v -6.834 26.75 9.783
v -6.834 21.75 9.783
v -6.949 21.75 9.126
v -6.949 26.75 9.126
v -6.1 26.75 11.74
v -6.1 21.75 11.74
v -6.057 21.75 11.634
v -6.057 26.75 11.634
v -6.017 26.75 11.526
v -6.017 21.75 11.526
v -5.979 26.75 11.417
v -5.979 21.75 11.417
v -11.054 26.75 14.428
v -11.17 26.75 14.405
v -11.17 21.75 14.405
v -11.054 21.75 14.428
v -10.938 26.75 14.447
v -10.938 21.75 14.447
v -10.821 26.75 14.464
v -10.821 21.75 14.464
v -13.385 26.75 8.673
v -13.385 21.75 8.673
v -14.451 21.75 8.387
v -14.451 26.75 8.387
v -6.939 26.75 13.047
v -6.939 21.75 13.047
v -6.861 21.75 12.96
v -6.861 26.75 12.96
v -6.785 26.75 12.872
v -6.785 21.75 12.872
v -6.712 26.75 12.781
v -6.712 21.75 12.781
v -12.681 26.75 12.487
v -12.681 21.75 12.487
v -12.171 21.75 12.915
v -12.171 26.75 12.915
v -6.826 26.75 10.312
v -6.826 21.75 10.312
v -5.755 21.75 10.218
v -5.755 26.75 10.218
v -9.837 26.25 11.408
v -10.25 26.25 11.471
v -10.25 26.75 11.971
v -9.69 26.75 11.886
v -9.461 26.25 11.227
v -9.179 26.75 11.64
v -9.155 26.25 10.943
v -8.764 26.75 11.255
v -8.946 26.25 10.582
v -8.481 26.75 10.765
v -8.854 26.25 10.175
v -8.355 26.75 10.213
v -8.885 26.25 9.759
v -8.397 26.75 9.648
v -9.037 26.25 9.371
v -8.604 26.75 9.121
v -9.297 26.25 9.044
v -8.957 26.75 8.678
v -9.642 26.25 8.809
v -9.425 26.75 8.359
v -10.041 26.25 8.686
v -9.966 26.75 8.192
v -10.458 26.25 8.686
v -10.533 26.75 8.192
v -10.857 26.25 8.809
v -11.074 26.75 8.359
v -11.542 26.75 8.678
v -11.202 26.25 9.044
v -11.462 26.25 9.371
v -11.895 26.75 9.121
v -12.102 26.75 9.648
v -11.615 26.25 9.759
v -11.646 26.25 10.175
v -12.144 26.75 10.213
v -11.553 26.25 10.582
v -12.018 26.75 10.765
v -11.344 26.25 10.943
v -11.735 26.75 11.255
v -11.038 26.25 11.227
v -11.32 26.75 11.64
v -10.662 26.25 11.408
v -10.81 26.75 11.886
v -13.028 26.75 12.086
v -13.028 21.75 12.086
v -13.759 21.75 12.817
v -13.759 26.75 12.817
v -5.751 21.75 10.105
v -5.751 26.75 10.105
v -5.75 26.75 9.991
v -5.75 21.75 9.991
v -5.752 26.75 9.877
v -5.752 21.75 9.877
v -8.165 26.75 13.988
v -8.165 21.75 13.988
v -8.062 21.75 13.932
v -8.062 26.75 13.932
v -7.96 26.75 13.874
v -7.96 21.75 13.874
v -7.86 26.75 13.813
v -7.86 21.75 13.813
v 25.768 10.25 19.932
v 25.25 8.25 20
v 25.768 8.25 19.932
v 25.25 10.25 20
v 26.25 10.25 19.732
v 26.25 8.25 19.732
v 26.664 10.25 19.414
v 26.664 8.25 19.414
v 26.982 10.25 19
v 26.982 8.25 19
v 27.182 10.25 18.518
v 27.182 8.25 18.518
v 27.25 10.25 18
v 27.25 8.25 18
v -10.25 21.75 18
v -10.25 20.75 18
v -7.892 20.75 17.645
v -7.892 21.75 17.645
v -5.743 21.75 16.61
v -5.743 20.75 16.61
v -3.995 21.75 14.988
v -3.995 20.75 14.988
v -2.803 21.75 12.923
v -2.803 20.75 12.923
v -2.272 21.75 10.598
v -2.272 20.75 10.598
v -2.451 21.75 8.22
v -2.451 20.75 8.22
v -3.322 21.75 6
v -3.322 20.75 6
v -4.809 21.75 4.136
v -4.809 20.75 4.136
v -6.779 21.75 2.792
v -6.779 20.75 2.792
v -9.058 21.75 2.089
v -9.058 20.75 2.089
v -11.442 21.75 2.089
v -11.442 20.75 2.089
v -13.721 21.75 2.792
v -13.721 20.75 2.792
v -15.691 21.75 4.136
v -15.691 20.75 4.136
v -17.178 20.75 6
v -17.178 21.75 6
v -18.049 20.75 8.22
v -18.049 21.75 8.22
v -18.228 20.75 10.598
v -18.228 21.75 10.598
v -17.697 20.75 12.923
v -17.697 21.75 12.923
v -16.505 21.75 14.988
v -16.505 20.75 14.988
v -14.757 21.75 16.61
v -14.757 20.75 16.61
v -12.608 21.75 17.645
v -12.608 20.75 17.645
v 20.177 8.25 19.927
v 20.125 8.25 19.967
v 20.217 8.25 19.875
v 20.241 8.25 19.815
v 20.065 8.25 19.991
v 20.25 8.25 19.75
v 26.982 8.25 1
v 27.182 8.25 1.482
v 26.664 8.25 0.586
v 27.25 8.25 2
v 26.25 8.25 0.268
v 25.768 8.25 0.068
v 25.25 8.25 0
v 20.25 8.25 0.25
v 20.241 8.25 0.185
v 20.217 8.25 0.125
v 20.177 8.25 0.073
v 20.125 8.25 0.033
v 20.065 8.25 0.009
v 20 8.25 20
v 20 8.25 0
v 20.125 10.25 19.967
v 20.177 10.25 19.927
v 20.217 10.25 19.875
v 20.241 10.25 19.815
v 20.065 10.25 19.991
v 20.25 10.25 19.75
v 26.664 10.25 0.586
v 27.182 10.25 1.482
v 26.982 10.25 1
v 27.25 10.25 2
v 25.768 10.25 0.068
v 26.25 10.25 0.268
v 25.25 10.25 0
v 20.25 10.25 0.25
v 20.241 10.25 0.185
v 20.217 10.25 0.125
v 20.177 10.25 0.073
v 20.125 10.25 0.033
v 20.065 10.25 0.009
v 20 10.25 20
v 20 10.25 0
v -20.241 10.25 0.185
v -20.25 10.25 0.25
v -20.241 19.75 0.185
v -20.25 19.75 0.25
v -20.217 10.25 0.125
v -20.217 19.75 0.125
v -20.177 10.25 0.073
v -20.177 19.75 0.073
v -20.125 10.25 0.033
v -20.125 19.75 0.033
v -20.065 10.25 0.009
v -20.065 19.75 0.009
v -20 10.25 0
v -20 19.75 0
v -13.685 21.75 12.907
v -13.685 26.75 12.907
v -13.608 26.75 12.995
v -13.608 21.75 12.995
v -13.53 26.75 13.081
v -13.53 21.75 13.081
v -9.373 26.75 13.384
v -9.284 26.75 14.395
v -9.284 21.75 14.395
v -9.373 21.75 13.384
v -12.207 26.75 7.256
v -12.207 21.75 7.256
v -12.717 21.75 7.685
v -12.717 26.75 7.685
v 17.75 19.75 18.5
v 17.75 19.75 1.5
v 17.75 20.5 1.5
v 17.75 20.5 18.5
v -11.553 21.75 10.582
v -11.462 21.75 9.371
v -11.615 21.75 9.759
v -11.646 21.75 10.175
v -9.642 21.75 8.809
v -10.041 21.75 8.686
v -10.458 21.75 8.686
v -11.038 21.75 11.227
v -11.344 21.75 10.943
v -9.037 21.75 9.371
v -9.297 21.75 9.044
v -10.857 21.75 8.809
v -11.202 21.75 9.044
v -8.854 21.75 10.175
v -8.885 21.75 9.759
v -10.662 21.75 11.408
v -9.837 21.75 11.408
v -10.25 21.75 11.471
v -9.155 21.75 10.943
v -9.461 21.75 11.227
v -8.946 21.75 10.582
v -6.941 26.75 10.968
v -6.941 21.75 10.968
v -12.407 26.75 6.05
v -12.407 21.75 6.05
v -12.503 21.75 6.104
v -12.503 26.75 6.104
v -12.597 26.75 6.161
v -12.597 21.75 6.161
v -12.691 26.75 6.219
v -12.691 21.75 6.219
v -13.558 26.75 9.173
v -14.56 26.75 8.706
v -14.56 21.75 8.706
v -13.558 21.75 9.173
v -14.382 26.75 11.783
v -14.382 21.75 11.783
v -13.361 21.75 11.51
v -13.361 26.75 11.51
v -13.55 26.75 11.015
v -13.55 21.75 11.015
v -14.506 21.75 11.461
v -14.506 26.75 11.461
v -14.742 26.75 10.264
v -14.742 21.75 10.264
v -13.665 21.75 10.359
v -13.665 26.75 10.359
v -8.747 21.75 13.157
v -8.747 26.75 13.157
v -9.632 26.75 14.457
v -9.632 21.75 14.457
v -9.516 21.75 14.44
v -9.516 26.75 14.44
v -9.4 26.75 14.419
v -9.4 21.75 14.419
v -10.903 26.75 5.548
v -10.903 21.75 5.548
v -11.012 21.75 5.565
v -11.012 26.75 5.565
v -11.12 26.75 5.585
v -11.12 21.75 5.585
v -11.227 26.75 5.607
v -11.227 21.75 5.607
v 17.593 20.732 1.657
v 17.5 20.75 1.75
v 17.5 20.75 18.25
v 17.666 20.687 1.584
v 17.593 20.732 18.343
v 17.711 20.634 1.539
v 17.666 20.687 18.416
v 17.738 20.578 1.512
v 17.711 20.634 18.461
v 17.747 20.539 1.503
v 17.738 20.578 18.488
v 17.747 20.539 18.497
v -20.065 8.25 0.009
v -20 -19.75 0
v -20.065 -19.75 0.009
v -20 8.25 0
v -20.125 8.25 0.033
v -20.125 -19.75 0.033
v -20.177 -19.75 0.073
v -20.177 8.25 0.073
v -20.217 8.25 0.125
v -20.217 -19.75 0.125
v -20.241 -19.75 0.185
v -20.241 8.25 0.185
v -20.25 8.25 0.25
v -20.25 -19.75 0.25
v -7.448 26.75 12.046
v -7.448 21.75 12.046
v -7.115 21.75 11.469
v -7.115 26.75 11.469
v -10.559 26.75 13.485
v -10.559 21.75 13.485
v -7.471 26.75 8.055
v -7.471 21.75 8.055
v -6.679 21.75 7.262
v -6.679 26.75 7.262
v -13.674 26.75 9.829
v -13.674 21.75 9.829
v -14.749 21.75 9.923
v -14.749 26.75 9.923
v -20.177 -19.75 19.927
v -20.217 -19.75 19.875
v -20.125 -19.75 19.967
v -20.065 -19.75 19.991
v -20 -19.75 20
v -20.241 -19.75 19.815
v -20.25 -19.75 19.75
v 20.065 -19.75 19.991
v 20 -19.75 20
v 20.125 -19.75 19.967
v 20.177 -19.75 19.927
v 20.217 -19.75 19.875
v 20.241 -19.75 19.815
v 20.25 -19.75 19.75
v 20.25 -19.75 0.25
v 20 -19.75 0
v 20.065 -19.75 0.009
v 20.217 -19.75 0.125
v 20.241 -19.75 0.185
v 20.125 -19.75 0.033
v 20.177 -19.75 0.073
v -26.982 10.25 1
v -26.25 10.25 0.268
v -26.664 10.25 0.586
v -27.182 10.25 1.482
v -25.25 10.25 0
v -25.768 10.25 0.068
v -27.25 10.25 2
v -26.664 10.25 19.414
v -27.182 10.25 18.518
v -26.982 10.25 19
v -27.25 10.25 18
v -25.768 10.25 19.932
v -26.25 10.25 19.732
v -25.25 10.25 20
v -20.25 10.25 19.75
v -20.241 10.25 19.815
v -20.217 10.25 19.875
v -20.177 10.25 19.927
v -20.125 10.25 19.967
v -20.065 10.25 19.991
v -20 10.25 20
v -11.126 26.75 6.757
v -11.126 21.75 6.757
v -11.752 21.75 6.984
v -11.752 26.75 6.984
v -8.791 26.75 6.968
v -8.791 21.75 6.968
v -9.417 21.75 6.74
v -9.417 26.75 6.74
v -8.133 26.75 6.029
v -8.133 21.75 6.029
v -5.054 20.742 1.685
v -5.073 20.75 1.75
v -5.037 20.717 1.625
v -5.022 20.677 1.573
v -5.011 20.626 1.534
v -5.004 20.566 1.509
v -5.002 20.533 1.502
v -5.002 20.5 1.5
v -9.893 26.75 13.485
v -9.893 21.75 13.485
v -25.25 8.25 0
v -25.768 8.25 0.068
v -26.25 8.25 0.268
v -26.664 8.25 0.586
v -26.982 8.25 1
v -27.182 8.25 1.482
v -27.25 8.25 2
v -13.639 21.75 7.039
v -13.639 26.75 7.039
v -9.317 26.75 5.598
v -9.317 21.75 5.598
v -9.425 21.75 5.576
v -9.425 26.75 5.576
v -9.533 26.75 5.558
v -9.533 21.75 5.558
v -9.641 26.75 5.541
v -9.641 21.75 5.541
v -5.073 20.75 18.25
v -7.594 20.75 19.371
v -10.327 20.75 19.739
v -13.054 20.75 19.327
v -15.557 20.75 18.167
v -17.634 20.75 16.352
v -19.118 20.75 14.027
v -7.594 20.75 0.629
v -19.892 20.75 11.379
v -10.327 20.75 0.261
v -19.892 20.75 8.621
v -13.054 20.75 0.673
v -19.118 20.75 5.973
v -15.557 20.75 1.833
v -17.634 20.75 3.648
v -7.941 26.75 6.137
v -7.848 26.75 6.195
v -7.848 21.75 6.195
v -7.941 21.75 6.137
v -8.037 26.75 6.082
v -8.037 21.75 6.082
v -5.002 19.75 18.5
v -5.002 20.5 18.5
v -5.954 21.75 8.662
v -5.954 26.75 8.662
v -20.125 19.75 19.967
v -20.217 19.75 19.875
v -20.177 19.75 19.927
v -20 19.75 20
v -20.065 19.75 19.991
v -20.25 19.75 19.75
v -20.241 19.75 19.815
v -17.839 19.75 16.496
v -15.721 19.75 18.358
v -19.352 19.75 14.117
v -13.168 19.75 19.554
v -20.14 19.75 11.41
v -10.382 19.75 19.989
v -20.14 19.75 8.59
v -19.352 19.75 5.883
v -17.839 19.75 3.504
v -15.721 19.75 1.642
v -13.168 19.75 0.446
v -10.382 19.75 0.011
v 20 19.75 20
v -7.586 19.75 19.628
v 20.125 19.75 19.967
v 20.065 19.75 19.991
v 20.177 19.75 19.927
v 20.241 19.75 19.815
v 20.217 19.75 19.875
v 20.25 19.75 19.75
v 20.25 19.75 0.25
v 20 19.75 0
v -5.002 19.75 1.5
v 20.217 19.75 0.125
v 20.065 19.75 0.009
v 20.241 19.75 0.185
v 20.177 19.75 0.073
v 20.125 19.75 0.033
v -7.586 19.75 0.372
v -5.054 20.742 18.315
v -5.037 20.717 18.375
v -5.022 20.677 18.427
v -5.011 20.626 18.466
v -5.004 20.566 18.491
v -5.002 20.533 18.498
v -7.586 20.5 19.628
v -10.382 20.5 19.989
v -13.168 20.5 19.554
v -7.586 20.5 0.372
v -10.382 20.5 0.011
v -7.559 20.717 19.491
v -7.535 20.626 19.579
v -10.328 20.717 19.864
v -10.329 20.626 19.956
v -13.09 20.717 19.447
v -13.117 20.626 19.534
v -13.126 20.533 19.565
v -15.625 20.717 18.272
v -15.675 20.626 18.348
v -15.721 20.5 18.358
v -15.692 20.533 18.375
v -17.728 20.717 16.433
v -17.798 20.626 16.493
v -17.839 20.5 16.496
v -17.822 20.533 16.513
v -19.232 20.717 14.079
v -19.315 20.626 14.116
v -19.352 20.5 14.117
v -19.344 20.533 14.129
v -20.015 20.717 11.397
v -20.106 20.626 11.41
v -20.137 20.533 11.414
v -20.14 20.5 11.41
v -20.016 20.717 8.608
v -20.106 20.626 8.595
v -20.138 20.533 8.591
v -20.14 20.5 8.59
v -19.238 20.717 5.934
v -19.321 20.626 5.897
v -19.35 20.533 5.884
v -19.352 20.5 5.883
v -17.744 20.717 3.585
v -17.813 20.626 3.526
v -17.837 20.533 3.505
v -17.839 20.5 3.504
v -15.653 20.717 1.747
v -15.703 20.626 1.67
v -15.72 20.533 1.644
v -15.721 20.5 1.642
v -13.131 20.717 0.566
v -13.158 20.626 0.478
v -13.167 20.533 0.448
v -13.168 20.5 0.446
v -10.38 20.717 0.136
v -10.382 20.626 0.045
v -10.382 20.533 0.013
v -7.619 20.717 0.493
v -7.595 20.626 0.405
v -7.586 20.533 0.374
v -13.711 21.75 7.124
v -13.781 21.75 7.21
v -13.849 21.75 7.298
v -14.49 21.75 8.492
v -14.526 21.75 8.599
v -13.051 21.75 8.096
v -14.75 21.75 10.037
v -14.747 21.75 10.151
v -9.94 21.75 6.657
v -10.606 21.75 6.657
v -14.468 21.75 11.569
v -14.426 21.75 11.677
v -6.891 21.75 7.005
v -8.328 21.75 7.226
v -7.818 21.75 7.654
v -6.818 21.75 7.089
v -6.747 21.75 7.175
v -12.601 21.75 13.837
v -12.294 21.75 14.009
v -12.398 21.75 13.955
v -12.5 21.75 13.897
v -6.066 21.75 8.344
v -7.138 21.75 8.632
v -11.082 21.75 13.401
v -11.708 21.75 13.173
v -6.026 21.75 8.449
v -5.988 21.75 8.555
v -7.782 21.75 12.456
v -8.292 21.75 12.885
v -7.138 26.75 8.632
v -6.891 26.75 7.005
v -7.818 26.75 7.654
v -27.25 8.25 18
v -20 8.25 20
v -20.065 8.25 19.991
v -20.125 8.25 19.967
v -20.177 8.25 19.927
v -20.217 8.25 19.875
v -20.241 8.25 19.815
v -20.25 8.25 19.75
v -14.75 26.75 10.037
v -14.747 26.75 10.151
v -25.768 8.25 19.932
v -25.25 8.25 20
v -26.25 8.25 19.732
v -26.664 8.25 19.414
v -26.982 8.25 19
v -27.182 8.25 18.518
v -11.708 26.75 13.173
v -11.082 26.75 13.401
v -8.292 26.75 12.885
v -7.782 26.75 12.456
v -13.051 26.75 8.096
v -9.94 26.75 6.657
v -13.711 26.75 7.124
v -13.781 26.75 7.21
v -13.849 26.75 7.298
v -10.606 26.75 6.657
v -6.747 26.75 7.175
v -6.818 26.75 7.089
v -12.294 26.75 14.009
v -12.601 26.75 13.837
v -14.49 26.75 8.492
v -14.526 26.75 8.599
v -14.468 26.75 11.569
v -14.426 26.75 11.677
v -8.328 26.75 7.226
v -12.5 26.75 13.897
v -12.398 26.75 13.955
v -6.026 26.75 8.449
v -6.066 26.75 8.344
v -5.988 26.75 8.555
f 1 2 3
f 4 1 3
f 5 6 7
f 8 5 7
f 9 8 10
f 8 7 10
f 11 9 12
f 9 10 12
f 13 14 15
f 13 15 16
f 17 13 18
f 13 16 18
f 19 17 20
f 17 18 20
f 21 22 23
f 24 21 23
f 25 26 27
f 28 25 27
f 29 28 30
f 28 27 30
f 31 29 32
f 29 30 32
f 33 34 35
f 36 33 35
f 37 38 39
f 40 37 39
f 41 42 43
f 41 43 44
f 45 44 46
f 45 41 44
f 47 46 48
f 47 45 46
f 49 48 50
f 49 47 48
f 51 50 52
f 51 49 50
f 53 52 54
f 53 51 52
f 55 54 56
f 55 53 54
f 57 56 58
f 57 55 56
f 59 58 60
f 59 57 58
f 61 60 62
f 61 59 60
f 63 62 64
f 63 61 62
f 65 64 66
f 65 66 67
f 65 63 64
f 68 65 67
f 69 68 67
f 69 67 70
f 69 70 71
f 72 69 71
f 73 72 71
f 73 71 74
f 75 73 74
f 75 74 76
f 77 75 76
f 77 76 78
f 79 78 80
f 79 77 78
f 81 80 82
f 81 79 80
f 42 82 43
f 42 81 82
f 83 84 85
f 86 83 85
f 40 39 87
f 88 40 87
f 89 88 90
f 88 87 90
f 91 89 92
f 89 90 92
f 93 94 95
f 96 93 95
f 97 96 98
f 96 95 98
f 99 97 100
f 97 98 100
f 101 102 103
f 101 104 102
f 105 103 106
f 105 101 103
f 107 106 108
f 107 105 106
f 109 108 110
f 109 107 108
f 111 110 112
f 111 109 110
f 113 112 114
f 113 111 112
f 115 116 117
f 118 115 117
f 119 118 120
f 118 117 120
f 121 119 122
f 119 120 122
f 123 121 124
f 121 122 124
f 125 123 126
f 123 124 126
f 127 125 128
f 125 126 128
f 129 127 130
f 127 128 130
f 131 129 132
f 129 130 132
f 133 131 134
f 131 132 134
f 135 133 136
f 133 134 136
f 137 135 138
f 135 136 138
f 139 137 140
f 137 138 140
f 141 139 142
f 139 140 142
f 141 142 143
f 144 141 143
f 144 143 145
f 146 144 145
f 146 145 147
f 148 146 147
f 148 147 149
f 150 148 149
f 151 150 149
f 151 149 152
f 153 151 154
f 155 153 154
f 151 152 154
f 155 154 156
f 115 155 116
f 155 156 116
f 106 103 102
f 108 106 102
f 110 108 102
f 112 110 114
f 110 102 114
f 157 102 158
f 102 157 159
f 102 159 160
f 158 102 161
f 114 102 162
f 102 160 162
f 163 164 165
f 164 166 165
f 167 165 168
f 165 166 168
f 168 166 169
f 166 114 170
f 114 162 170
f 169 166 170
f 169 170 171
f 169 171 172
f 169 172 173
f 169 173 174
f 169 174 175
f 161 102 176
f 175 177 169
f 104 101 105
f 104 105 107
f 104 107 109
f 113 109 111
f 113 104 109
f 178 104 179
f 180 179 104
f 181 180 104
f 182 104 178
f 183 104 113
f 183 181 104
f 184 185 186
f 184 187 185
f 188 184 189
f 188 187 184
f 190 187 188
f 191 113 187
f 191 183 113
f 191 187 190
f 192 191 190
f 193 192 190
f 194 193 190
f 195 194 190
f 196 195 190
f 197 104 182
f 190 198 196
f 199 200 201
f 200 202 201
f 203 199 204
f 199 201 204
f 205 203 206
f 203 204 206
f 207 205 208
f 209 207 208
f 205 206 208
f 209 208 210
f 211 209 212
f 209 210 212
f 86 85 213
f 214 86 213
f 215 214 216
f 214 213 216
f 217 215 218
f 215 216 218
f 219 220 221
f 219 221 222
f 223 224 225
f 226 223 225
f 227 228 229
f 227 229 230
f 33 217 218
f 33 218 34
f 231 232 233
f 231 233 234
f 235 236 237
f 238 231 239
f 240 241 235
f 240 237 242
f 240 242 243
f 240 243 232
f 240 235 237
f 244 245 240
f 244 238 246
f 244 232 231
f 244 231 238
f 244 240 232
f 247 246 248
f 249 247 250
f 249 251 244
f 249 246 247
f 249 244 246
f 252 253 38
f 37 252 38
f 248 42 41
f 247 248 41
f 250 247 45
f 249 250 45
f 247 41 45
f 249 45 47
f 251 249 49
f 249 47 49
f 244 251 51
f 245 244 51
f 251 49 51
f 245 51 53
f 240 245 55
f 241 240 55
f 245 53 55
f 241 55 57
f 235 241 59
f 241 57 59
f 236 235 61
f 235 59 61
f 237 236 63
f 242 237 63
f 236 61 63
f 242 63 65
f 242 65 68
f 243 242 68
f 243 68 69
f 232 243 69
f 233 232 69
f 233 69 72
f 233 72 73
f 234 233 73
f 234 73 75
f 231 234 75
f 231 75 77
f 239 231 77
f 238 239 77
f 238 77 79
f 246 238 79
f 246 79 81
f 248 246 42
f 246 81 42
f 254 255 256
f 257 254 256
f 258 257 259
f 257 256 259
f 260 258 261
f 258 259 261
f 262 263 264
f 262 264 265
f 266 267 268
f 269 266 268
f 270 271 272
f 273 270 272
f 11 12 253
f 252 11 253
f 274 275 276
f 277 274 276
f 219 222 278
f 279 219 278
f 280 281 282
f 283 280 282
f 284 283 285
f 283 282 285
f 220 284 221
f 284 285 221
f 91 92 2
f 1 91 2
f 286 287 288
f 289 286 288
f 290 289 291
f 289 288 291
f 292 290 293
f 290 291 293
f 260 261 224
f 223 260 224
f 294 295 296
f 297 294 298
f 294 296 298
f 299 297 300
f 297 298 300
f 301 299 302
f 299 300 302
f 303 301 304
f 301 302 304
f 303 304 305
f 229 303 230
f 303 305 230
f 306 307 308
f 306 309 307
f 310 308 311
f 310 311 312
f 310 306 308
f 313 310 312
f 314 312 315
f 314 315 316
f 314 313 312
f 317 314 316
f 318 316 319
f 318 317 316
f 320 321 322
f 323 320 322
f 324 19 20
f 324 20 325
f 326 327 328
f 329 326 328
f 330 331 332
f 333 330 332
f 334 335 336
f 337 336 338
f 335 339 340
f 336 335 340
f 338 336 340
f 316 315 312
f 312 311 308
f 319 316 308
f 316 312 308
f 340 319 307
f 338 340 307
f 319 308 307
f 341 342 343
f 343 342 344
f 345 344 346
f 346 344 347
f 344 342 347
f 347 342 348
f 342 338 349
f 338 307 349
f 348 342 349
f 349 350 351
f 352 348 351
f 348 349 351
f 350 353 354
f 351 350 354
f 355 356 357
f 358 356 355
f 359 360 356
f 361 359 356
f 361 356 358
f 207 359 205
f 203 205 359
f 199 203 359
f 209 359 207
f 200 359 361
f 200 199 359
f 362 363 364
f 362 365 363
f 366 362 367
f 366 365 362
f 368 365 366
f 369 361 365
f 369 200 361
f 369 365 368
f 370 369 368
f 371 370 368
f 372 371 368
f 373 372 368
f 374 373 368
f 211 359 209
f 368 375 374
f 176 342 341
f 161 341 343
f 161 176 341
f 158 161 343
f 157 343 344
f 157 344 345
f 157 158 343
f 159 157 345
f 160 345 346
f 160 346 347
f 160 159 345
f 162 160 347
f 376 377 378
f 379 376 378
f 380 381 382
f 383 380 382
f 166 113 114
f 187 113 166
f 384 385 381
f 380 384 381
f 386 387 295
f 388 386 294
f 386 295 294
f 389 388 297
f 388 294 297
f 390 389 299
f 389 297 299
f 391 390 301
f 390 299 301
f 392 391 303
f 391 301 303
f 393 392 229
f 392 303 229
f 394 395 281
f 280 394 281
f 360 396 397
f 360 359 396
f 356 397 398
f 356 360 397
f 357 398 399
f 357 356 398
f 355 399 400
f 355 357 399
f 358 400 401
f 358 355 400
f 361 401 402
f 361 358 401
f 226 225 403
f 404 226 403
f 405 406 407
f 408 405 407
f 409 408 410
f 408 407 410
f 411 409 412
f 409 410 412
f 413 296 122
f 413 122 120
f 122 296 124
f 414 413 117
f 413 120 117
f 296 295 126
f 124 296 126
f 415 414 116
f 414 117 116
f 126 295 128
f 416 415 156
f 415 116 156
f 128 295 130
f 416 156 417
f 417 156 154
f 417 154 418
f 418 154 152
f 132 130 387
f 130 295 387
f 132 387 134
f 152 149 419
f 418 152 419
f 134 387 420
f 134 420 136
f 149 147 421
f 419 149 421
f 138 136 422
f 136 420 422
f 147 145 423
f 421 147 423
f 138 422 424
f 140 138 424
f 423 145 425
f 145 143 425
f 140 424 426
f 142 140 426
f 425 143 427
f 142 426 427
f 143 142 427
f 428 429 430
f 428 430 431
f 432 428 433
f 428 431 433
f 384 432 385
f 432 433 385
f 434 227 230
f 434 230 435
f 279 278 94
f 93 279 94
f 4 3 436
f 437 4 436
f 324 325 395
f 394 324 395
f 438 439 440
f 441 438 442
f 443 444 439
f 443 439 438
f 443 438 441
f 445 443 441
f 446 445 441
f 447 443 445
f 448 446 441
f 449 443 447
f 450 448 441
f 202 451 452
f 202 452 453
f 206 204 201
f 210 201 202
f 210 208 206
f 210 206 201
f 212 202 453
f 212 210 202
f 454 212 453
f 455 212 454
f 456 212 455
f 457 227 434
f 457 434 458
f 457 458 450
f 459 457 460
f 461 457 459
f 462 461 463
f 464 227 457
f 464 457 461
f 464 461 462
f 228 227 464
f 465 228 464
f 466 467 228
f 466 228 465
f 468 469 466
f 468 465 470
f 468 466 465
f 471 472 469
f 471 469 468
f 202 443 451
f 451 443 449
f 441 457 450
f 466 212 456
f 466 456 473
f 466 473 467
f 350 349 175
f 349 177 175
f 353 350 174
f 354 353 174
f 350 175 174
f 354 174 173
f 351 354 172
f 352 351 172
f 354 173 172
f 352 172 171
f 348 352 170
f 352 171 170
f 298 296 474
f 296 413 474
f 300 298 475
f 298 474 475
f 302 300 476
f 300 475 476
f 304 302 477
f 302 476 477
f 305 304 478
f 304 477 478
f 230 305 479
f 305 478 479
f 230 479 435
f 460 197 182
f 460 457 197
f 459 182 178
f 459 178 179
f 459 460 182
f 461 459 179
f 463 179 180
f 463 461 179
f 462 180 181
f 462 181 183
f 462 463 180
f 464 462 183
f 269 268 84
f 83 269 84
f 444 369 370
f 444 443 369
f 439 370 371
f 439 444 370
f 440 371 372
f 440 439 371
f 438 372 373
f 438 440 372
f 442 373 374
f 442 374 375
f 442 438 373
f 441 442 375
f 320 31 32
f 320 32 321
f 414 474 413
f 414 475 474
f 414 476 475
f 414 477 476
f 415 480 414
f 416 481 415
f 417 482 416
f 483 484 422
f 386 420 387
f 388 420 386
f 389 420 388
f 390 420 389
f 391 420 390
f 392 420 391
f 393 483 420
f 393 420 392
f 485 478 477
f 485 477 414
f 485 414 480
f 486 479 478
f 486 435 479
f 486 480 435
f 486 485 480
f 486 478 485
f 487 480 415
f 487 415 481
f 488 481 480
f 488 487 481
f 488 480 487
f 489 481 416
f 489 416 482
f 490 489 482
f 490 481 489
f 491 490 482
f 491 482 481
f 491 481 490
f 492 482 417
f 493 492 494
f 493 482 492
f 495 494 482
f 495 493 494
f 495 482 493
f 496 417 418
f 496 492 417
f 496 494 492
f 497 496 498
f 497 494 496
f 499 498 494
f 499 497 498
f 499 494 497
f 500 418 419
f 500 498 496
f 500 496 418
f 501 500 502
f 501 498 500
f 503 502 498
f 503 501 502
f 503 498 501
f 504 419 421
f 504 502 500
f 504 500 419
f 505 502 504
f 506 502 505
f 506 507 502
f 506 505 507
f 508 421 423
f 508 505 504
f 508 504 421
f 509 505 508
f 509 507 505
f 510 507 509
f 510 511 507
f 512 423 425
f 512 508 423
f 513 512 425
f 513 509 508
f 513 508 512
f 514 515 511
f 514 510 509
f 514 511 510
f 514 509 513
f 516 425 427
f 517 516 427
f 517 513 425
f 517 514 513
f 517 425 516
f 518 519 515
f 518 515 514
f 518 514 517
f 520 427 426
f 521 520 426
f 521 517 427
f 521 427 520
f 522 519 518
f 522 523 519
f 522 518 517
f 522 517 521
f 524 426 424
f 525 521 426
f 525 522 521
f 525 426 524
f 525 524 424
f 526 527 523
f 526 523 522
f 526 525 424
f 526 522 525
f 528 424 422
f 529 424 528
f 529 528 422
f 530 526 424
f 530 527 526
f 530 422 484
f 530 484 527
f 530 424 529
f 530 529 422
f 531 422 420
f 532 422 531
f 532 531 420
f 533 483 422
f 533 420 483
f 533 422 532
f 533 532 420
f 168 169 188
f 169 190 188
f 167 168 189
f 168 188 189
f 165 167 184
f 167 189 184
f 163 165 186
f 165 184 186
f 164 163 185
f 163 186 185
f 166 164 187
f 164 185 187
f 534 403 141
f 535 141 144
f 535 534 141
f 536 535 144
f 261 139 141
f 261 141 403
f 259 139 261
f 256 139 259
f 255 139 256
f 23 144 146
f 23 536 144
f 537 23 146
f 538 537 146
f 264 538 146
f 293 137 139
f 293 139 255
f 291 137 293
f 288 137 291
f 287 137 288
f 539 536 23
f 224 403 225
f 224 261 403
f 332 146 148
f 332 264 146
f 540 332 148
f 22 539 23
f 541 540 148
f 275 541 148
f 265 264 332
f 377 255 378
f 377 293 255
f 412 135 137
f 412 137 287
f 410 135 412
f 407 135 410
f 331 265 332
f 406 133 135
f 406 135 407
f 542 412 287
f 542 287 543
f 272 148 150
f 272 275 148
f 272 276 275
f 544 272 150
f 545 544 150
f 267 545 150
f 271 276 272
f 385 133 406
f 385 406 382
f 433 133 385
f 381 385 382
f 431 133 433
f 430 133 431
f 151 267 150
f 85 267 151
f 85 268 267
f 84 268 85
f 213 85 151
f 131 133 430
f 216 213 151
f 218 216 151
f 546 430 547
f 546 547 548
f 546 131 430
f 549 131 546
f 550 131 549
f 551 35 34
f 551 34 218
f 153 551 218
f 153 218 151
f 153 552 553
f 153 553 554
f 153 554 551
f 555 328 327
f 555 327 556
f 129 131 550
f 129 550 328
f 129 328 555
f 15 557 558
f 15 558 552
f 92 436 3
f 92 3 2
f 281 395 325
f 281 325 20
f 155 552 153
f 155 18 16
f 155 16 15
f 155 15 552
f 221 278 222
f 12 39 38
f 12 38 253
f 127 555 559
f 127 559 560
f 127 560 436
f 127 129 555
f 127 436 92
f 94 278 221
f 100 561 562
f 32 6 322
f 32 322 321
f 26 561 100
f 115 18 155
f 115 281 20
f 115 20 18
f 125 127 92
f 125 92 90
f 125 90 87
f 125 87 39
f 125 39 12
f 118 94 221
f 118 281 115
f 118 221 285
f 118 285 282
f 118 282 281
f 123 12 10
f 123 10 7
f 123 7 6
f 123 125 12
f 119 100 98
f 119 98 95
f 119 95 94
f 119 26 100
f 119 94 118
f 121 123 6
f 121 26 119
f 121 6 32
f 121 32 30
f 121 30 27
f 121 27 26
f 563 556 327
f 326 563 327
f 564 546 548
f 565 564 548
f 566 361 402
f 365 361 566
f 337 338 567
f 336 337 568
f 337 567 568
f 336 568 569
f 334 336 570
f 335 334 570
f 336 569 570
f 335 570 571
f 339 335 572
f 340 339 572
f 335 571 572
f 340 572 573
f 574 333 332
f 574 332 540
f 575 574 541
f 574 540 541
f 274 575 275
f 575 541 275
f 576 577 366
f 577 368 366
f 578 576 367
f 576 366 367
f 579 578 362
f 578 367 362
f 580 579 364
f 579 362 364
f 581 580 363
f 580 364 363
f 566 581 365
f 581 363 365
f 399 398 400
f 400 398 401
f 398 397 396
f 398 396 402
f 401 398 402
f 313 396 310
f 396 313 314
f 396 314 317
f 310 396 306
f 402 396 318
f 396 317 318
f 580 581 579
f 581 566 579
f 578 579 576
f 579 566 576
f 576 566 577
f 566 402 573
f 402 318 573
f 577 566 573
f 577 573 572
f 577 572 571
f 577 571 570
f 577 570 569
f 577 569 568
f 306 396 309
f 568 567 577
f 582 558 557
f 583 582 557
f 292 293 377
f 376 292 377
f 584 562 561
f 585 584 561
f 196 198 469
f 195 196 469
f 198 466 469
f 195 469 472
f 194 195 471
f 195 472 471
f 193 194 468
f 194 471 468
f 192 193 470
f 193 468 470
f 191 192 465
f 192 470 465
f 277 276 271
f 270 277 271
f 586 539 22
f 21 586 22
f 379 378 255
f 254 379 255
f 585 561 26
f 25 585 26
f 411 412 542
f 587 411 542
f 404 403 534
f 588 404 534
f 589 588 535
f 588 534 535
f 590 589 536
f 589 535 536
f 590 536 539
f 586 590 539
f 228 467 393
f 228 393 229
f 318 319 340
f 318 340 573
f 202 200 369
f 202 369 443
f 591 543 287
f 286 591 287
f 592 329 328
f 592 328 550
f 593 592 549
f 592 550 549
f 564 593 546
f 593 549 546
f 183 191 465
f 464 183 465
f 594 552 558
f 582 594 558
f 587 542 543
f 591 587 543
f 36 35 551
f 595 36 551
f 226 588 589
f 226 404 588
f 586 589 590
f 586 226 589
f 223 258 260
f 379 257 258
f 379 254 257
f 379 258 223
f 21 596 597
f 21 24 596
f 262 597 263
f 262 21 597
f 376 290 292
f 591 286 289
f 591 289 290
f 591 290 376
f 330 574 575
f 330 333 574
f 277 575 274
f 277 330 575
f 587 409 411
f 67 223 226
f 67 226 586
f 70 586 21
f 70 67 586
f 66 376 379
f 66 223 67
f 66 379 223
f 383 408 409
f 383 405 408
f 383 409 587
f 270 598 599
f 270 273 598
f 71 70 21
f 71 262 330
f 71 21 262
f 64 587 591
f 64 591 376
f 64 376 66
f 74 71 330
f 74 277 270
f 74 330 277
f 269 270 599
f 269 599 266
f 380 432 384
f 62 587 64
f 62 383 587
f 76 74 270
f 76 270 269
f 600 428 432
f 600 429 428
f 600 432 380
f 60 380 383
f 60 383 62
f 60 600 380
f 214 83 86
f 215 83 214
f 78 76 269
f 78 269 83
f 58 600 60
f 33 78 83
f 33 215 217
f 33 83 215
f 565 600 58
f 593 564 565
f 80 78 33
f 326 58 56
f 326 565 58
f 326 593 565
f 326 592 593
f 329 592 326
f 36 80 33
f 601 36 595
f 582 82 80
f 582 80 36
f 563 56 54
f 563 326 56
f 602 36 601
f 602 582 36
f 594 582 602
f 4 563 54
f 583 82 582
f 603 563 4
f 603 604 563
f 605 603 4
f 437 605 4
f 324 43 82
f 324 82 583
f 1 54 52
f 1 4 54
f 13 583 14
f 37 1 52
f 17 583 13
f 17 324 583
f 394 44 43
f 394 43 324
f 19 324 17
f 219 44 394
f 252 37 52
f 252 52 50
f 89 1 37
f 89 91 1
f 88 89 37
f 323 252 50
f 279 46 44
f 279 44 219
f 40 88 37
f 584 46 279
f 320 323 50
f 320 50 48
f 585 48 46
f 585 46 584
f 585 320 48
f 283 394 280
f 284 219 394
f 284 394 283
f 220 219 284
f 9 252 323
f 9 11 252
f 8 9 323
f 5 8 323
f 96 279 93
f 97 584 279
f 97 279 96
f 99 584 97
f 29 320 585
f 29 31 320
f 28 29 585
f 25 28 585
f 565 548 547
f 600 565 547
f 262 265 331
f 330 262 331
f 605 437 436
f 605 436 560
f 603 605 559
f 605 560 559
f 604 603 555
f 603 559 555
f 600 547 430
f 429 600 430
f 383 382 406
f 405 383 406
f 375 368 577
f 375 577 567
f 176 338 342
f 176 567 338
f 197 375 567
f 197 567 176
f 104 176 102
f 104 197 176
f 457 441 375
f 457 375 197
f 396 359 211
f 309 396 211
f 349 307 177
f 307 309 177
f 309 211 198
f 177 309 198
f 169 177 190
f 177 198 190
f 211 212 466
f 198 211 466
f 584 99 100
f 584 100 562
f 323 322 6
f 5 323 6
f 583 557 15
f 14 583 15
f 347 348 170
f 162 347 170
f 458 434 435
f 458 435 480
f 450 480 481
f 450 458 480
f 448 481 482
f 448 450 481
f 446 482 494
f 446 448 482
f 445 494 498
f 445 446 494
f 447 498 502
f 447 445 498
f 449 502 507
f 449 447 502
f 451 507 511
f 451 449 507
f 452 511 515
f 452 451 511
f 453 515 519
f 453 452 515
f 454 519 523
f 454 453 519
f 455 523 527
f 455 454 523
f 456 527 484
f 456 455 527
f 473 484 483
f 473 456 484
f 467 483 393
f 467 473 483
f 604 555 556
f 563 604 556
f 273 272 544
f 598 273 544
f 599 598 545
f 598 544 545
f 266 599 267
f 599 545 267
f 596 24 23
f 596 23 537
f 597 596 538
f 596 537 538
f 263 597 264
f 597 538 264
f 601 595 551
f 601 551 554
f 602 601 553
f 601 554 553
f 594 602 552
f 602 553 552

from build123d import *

# Parameters (mm, degrees)
ESQUISSE1_W                  = 40.5
ESQUISSE1_H                  = 39.5
BOSS_EXTRU_1_DEPTH           = 20
ESQUISSE2_W                  = 20
ESQUISSE2_H                  = 2
BOSS_EXTRU_2_DEPTH           = 7
ESQUISSE3_W                  = 20
ESQUISSE3_H                  = 2
BOSS_EXTRU_3_DEPTH           = 7
CONG_1_R                     = 2
BOSS_EXTRU_4_DEPTH           = 1
ESQUISSE6_R                  = 8
BOSS_EXTRU_5_DEPTH           = 1
ESQUISSE7_R                  = 4.5
BOSS_EXTRU_6_DEPTH           = 5
ENL_V_START                  = -5
ENL_V_MAT_EXTRU_2_DEPTH      = 5
R_P_TITION_CIRCULAIRE2_COUNT = 18
ESQUISSE9_R                  = 1.4
ENL_V_MAT_EXTRU_3_DEPTH      = 5
CHANFREIN1_SIZE              = 0.5
CONG_3_R                     = 0.25
CONG_4_R                     = 0.25


with BuildPart() as part:
    # Esquisse1 → Boss.-Extru.1 (new body)
    with BuildSketch(Plane.XY):
        Rectangle(ESQUISSE1_W, ESQUISSE1_H)
    extrude(amount=BOSS_EXTRU_1_DEPTH)

    # Esquisse2 → Boss.-Extru.2 (add)
    with BuildSketch(Plane.ZY.offset(20.25)):
        with Locations((10, 9.25)):
            Rectangle(ESQUISSE2_W, ESQUISSE2_H)
    extrude(amount=BOSS_EXTRU_2_DEPTH)

    # Esquisse3 → Boss.-Extru.3 (add)
    with BuildSketch(Plane(origin=(20.25, 0, 0), x_dir=(0, 0, -1), z_dir=(1, 0, 0))):
        with Locations((-10, 9.25)):
            Rectangle(ESQUISSE3_W, ESQUISSE3_H)
    extrude(amount=BOSS_EXTRU_3_DEPTH)

    # Congé1
    cong_1_edges = [part.edges().sort_by_distance(p)[0] for p in [
        (-27.25, 9.25, 0),
        (-27.25, 9.25, 20),
        (27.25, 9.25, 20),
        (27.25, 9.25, 0),
    ]]
    fillet(cong_1_edges, radius=CONG_1_R)

    # Esquisse4 → Boss.-Extru.4 (add)
    with BuildSketch(Plane(origin=(0, 19.75, 0), x_dir=(1, 0, 0), z_dir=(0, 1, 0))):
        with BuildLine():
            Line((17.75, -1.5), (17.75, -18.5))
            Line((17.75, -18.5), (-5.001587186, -18.5))
            ThreePointArc((-5.001587186, -18.5), (-20.239786638, -10), (-5.001587186, -1.5))
            Line((-5.001587186, -1.5), (17.75, -1.5))
        make_face()
    extrude(amount=BOSS_EXTRU_4_DEPTH)

    # Esquisse6 → Boss.-Extru.5 (add)
    with BuildSketch(Plane(origin=(0, 20.75, 0), x_dir=(1, 0, 0), z_dir=(0, 1, 0))):
        with Locations(Location((-10.25, -10, 0), (0, 0, 270))):
            Circle(ESQUISSE6_R)
    extrude(amount=BOSS_EXTRU_5_DEPTH)

    # Esquisse7 → Boss.-Extru.6 (add)
    with BuildSketch(Plane(origin=(0, 21.75, 0), x_dir=(1, 0, 0), z_dir=(0, 1, 0))):
        with Locations(Location((-10.25, -10, 0), (0, 0, 270))):
            Circle(ESQUISSE7_R)
    extrude(amount=BOSS_EXTRU_6_DEPTH)

    # Esquisse8 → Enlèv. mat.-Extru.2 (cut)
    with BuildSketch(Plane(origin=(0, 26.75, 0), x_dir=(1, 0, 0), z_dir=(0, 1, 0)).offset(ENL_V_START)):
        with BuildLine():
            Line((-10.606352849, -6.656584169), (-10.903477232, -5.547700874))
            ThreePointArc((-10.903477232, -5.547700874), (-10.272597671, -5.50005674), (-9.641271425, -5.541362369))
            Line((-9.641271425, -5.541362369), (-9.940094206, -6.656584169))
            Line((-9.940094206, -6.656584169), (-10.606352849, -6.656584169))
        make_face()
    enl_v_mat_extru_2 = extrude(amount=ENL_V_MAT_EXTRU_2_DEPTH, mode=Mode.SUBTRACT)

    # Répétition circulaire2: Enlèv. mat.-Extru.2 ×18 about axis
    r_p_tition_circulaire2_axis = Axis((-10.249601616, 0, 10.07055578), (0, 1, 0))
    for i in range(1, R_P_TITION_CIRCULAIRE2_COUNT):
        add(enl_v_mat_extru_2.rotate(r_p_tition_circulaire2_axis, i * 360 / R_P_TITION_CIRCULAIRE2_COUNT), mode=Mode.SUBTRACT)

    # Esquisse9 → Enlèv. mat.-Extru.3 (cut)
    with BuildSketch(Plane(origin=(0, 26.75, 0), x_dir=(1, 0, 0), z_dir=(0, 1, 0))):
        with Locations(Location((-10.249601616, -10.07055578, 0), (0, 0, 270))):
            Circle(ESQUISSE9_R)
    extrude(amount=-ENL_V_MAT_EXTRU_3_DEPTH, mode=Mode.SUBTRACT)

    # Chanfrein1
    chanfrein1_edges = [part.edges().sort_by_distance(p)[0] for p in [
        (-10.249601616, 26.75, 8.67055578),
    ]]
    chamfer(chanfrein1_edges, length=CHANFREIN1_SIZE)

    # Congé3
    cong_3_edges = [part.edges().sort_by_distance(p)[0] for p in [
        (6.374206407, 20.75, 1.5),
        (-20.239786638, 20.75, 10),
        (6.374206407, 20.75, 18.5),
        (17.75, 20.75, 10),
    ]]
    fillet(cong_3_edges, radius=CONG_3_R)

    # Congé4
    cong_4_edges = [part.edges().sort_by_distance(p)[0] for p in [
        (-20.25, 15, 20),
        (-20.25, -5.75, 0),
        (-20.25, -5.75, 20),
        (20.25, 15, 0),
        (20.25, 15, 20),
        (20.25, -5.75, 20),
        (-20.25, 15, 0),
        (20.25, -5.75, 0),
    ]]
    fillet(cong_4_edges, radius=CONG_4_R)


solid = part.part
